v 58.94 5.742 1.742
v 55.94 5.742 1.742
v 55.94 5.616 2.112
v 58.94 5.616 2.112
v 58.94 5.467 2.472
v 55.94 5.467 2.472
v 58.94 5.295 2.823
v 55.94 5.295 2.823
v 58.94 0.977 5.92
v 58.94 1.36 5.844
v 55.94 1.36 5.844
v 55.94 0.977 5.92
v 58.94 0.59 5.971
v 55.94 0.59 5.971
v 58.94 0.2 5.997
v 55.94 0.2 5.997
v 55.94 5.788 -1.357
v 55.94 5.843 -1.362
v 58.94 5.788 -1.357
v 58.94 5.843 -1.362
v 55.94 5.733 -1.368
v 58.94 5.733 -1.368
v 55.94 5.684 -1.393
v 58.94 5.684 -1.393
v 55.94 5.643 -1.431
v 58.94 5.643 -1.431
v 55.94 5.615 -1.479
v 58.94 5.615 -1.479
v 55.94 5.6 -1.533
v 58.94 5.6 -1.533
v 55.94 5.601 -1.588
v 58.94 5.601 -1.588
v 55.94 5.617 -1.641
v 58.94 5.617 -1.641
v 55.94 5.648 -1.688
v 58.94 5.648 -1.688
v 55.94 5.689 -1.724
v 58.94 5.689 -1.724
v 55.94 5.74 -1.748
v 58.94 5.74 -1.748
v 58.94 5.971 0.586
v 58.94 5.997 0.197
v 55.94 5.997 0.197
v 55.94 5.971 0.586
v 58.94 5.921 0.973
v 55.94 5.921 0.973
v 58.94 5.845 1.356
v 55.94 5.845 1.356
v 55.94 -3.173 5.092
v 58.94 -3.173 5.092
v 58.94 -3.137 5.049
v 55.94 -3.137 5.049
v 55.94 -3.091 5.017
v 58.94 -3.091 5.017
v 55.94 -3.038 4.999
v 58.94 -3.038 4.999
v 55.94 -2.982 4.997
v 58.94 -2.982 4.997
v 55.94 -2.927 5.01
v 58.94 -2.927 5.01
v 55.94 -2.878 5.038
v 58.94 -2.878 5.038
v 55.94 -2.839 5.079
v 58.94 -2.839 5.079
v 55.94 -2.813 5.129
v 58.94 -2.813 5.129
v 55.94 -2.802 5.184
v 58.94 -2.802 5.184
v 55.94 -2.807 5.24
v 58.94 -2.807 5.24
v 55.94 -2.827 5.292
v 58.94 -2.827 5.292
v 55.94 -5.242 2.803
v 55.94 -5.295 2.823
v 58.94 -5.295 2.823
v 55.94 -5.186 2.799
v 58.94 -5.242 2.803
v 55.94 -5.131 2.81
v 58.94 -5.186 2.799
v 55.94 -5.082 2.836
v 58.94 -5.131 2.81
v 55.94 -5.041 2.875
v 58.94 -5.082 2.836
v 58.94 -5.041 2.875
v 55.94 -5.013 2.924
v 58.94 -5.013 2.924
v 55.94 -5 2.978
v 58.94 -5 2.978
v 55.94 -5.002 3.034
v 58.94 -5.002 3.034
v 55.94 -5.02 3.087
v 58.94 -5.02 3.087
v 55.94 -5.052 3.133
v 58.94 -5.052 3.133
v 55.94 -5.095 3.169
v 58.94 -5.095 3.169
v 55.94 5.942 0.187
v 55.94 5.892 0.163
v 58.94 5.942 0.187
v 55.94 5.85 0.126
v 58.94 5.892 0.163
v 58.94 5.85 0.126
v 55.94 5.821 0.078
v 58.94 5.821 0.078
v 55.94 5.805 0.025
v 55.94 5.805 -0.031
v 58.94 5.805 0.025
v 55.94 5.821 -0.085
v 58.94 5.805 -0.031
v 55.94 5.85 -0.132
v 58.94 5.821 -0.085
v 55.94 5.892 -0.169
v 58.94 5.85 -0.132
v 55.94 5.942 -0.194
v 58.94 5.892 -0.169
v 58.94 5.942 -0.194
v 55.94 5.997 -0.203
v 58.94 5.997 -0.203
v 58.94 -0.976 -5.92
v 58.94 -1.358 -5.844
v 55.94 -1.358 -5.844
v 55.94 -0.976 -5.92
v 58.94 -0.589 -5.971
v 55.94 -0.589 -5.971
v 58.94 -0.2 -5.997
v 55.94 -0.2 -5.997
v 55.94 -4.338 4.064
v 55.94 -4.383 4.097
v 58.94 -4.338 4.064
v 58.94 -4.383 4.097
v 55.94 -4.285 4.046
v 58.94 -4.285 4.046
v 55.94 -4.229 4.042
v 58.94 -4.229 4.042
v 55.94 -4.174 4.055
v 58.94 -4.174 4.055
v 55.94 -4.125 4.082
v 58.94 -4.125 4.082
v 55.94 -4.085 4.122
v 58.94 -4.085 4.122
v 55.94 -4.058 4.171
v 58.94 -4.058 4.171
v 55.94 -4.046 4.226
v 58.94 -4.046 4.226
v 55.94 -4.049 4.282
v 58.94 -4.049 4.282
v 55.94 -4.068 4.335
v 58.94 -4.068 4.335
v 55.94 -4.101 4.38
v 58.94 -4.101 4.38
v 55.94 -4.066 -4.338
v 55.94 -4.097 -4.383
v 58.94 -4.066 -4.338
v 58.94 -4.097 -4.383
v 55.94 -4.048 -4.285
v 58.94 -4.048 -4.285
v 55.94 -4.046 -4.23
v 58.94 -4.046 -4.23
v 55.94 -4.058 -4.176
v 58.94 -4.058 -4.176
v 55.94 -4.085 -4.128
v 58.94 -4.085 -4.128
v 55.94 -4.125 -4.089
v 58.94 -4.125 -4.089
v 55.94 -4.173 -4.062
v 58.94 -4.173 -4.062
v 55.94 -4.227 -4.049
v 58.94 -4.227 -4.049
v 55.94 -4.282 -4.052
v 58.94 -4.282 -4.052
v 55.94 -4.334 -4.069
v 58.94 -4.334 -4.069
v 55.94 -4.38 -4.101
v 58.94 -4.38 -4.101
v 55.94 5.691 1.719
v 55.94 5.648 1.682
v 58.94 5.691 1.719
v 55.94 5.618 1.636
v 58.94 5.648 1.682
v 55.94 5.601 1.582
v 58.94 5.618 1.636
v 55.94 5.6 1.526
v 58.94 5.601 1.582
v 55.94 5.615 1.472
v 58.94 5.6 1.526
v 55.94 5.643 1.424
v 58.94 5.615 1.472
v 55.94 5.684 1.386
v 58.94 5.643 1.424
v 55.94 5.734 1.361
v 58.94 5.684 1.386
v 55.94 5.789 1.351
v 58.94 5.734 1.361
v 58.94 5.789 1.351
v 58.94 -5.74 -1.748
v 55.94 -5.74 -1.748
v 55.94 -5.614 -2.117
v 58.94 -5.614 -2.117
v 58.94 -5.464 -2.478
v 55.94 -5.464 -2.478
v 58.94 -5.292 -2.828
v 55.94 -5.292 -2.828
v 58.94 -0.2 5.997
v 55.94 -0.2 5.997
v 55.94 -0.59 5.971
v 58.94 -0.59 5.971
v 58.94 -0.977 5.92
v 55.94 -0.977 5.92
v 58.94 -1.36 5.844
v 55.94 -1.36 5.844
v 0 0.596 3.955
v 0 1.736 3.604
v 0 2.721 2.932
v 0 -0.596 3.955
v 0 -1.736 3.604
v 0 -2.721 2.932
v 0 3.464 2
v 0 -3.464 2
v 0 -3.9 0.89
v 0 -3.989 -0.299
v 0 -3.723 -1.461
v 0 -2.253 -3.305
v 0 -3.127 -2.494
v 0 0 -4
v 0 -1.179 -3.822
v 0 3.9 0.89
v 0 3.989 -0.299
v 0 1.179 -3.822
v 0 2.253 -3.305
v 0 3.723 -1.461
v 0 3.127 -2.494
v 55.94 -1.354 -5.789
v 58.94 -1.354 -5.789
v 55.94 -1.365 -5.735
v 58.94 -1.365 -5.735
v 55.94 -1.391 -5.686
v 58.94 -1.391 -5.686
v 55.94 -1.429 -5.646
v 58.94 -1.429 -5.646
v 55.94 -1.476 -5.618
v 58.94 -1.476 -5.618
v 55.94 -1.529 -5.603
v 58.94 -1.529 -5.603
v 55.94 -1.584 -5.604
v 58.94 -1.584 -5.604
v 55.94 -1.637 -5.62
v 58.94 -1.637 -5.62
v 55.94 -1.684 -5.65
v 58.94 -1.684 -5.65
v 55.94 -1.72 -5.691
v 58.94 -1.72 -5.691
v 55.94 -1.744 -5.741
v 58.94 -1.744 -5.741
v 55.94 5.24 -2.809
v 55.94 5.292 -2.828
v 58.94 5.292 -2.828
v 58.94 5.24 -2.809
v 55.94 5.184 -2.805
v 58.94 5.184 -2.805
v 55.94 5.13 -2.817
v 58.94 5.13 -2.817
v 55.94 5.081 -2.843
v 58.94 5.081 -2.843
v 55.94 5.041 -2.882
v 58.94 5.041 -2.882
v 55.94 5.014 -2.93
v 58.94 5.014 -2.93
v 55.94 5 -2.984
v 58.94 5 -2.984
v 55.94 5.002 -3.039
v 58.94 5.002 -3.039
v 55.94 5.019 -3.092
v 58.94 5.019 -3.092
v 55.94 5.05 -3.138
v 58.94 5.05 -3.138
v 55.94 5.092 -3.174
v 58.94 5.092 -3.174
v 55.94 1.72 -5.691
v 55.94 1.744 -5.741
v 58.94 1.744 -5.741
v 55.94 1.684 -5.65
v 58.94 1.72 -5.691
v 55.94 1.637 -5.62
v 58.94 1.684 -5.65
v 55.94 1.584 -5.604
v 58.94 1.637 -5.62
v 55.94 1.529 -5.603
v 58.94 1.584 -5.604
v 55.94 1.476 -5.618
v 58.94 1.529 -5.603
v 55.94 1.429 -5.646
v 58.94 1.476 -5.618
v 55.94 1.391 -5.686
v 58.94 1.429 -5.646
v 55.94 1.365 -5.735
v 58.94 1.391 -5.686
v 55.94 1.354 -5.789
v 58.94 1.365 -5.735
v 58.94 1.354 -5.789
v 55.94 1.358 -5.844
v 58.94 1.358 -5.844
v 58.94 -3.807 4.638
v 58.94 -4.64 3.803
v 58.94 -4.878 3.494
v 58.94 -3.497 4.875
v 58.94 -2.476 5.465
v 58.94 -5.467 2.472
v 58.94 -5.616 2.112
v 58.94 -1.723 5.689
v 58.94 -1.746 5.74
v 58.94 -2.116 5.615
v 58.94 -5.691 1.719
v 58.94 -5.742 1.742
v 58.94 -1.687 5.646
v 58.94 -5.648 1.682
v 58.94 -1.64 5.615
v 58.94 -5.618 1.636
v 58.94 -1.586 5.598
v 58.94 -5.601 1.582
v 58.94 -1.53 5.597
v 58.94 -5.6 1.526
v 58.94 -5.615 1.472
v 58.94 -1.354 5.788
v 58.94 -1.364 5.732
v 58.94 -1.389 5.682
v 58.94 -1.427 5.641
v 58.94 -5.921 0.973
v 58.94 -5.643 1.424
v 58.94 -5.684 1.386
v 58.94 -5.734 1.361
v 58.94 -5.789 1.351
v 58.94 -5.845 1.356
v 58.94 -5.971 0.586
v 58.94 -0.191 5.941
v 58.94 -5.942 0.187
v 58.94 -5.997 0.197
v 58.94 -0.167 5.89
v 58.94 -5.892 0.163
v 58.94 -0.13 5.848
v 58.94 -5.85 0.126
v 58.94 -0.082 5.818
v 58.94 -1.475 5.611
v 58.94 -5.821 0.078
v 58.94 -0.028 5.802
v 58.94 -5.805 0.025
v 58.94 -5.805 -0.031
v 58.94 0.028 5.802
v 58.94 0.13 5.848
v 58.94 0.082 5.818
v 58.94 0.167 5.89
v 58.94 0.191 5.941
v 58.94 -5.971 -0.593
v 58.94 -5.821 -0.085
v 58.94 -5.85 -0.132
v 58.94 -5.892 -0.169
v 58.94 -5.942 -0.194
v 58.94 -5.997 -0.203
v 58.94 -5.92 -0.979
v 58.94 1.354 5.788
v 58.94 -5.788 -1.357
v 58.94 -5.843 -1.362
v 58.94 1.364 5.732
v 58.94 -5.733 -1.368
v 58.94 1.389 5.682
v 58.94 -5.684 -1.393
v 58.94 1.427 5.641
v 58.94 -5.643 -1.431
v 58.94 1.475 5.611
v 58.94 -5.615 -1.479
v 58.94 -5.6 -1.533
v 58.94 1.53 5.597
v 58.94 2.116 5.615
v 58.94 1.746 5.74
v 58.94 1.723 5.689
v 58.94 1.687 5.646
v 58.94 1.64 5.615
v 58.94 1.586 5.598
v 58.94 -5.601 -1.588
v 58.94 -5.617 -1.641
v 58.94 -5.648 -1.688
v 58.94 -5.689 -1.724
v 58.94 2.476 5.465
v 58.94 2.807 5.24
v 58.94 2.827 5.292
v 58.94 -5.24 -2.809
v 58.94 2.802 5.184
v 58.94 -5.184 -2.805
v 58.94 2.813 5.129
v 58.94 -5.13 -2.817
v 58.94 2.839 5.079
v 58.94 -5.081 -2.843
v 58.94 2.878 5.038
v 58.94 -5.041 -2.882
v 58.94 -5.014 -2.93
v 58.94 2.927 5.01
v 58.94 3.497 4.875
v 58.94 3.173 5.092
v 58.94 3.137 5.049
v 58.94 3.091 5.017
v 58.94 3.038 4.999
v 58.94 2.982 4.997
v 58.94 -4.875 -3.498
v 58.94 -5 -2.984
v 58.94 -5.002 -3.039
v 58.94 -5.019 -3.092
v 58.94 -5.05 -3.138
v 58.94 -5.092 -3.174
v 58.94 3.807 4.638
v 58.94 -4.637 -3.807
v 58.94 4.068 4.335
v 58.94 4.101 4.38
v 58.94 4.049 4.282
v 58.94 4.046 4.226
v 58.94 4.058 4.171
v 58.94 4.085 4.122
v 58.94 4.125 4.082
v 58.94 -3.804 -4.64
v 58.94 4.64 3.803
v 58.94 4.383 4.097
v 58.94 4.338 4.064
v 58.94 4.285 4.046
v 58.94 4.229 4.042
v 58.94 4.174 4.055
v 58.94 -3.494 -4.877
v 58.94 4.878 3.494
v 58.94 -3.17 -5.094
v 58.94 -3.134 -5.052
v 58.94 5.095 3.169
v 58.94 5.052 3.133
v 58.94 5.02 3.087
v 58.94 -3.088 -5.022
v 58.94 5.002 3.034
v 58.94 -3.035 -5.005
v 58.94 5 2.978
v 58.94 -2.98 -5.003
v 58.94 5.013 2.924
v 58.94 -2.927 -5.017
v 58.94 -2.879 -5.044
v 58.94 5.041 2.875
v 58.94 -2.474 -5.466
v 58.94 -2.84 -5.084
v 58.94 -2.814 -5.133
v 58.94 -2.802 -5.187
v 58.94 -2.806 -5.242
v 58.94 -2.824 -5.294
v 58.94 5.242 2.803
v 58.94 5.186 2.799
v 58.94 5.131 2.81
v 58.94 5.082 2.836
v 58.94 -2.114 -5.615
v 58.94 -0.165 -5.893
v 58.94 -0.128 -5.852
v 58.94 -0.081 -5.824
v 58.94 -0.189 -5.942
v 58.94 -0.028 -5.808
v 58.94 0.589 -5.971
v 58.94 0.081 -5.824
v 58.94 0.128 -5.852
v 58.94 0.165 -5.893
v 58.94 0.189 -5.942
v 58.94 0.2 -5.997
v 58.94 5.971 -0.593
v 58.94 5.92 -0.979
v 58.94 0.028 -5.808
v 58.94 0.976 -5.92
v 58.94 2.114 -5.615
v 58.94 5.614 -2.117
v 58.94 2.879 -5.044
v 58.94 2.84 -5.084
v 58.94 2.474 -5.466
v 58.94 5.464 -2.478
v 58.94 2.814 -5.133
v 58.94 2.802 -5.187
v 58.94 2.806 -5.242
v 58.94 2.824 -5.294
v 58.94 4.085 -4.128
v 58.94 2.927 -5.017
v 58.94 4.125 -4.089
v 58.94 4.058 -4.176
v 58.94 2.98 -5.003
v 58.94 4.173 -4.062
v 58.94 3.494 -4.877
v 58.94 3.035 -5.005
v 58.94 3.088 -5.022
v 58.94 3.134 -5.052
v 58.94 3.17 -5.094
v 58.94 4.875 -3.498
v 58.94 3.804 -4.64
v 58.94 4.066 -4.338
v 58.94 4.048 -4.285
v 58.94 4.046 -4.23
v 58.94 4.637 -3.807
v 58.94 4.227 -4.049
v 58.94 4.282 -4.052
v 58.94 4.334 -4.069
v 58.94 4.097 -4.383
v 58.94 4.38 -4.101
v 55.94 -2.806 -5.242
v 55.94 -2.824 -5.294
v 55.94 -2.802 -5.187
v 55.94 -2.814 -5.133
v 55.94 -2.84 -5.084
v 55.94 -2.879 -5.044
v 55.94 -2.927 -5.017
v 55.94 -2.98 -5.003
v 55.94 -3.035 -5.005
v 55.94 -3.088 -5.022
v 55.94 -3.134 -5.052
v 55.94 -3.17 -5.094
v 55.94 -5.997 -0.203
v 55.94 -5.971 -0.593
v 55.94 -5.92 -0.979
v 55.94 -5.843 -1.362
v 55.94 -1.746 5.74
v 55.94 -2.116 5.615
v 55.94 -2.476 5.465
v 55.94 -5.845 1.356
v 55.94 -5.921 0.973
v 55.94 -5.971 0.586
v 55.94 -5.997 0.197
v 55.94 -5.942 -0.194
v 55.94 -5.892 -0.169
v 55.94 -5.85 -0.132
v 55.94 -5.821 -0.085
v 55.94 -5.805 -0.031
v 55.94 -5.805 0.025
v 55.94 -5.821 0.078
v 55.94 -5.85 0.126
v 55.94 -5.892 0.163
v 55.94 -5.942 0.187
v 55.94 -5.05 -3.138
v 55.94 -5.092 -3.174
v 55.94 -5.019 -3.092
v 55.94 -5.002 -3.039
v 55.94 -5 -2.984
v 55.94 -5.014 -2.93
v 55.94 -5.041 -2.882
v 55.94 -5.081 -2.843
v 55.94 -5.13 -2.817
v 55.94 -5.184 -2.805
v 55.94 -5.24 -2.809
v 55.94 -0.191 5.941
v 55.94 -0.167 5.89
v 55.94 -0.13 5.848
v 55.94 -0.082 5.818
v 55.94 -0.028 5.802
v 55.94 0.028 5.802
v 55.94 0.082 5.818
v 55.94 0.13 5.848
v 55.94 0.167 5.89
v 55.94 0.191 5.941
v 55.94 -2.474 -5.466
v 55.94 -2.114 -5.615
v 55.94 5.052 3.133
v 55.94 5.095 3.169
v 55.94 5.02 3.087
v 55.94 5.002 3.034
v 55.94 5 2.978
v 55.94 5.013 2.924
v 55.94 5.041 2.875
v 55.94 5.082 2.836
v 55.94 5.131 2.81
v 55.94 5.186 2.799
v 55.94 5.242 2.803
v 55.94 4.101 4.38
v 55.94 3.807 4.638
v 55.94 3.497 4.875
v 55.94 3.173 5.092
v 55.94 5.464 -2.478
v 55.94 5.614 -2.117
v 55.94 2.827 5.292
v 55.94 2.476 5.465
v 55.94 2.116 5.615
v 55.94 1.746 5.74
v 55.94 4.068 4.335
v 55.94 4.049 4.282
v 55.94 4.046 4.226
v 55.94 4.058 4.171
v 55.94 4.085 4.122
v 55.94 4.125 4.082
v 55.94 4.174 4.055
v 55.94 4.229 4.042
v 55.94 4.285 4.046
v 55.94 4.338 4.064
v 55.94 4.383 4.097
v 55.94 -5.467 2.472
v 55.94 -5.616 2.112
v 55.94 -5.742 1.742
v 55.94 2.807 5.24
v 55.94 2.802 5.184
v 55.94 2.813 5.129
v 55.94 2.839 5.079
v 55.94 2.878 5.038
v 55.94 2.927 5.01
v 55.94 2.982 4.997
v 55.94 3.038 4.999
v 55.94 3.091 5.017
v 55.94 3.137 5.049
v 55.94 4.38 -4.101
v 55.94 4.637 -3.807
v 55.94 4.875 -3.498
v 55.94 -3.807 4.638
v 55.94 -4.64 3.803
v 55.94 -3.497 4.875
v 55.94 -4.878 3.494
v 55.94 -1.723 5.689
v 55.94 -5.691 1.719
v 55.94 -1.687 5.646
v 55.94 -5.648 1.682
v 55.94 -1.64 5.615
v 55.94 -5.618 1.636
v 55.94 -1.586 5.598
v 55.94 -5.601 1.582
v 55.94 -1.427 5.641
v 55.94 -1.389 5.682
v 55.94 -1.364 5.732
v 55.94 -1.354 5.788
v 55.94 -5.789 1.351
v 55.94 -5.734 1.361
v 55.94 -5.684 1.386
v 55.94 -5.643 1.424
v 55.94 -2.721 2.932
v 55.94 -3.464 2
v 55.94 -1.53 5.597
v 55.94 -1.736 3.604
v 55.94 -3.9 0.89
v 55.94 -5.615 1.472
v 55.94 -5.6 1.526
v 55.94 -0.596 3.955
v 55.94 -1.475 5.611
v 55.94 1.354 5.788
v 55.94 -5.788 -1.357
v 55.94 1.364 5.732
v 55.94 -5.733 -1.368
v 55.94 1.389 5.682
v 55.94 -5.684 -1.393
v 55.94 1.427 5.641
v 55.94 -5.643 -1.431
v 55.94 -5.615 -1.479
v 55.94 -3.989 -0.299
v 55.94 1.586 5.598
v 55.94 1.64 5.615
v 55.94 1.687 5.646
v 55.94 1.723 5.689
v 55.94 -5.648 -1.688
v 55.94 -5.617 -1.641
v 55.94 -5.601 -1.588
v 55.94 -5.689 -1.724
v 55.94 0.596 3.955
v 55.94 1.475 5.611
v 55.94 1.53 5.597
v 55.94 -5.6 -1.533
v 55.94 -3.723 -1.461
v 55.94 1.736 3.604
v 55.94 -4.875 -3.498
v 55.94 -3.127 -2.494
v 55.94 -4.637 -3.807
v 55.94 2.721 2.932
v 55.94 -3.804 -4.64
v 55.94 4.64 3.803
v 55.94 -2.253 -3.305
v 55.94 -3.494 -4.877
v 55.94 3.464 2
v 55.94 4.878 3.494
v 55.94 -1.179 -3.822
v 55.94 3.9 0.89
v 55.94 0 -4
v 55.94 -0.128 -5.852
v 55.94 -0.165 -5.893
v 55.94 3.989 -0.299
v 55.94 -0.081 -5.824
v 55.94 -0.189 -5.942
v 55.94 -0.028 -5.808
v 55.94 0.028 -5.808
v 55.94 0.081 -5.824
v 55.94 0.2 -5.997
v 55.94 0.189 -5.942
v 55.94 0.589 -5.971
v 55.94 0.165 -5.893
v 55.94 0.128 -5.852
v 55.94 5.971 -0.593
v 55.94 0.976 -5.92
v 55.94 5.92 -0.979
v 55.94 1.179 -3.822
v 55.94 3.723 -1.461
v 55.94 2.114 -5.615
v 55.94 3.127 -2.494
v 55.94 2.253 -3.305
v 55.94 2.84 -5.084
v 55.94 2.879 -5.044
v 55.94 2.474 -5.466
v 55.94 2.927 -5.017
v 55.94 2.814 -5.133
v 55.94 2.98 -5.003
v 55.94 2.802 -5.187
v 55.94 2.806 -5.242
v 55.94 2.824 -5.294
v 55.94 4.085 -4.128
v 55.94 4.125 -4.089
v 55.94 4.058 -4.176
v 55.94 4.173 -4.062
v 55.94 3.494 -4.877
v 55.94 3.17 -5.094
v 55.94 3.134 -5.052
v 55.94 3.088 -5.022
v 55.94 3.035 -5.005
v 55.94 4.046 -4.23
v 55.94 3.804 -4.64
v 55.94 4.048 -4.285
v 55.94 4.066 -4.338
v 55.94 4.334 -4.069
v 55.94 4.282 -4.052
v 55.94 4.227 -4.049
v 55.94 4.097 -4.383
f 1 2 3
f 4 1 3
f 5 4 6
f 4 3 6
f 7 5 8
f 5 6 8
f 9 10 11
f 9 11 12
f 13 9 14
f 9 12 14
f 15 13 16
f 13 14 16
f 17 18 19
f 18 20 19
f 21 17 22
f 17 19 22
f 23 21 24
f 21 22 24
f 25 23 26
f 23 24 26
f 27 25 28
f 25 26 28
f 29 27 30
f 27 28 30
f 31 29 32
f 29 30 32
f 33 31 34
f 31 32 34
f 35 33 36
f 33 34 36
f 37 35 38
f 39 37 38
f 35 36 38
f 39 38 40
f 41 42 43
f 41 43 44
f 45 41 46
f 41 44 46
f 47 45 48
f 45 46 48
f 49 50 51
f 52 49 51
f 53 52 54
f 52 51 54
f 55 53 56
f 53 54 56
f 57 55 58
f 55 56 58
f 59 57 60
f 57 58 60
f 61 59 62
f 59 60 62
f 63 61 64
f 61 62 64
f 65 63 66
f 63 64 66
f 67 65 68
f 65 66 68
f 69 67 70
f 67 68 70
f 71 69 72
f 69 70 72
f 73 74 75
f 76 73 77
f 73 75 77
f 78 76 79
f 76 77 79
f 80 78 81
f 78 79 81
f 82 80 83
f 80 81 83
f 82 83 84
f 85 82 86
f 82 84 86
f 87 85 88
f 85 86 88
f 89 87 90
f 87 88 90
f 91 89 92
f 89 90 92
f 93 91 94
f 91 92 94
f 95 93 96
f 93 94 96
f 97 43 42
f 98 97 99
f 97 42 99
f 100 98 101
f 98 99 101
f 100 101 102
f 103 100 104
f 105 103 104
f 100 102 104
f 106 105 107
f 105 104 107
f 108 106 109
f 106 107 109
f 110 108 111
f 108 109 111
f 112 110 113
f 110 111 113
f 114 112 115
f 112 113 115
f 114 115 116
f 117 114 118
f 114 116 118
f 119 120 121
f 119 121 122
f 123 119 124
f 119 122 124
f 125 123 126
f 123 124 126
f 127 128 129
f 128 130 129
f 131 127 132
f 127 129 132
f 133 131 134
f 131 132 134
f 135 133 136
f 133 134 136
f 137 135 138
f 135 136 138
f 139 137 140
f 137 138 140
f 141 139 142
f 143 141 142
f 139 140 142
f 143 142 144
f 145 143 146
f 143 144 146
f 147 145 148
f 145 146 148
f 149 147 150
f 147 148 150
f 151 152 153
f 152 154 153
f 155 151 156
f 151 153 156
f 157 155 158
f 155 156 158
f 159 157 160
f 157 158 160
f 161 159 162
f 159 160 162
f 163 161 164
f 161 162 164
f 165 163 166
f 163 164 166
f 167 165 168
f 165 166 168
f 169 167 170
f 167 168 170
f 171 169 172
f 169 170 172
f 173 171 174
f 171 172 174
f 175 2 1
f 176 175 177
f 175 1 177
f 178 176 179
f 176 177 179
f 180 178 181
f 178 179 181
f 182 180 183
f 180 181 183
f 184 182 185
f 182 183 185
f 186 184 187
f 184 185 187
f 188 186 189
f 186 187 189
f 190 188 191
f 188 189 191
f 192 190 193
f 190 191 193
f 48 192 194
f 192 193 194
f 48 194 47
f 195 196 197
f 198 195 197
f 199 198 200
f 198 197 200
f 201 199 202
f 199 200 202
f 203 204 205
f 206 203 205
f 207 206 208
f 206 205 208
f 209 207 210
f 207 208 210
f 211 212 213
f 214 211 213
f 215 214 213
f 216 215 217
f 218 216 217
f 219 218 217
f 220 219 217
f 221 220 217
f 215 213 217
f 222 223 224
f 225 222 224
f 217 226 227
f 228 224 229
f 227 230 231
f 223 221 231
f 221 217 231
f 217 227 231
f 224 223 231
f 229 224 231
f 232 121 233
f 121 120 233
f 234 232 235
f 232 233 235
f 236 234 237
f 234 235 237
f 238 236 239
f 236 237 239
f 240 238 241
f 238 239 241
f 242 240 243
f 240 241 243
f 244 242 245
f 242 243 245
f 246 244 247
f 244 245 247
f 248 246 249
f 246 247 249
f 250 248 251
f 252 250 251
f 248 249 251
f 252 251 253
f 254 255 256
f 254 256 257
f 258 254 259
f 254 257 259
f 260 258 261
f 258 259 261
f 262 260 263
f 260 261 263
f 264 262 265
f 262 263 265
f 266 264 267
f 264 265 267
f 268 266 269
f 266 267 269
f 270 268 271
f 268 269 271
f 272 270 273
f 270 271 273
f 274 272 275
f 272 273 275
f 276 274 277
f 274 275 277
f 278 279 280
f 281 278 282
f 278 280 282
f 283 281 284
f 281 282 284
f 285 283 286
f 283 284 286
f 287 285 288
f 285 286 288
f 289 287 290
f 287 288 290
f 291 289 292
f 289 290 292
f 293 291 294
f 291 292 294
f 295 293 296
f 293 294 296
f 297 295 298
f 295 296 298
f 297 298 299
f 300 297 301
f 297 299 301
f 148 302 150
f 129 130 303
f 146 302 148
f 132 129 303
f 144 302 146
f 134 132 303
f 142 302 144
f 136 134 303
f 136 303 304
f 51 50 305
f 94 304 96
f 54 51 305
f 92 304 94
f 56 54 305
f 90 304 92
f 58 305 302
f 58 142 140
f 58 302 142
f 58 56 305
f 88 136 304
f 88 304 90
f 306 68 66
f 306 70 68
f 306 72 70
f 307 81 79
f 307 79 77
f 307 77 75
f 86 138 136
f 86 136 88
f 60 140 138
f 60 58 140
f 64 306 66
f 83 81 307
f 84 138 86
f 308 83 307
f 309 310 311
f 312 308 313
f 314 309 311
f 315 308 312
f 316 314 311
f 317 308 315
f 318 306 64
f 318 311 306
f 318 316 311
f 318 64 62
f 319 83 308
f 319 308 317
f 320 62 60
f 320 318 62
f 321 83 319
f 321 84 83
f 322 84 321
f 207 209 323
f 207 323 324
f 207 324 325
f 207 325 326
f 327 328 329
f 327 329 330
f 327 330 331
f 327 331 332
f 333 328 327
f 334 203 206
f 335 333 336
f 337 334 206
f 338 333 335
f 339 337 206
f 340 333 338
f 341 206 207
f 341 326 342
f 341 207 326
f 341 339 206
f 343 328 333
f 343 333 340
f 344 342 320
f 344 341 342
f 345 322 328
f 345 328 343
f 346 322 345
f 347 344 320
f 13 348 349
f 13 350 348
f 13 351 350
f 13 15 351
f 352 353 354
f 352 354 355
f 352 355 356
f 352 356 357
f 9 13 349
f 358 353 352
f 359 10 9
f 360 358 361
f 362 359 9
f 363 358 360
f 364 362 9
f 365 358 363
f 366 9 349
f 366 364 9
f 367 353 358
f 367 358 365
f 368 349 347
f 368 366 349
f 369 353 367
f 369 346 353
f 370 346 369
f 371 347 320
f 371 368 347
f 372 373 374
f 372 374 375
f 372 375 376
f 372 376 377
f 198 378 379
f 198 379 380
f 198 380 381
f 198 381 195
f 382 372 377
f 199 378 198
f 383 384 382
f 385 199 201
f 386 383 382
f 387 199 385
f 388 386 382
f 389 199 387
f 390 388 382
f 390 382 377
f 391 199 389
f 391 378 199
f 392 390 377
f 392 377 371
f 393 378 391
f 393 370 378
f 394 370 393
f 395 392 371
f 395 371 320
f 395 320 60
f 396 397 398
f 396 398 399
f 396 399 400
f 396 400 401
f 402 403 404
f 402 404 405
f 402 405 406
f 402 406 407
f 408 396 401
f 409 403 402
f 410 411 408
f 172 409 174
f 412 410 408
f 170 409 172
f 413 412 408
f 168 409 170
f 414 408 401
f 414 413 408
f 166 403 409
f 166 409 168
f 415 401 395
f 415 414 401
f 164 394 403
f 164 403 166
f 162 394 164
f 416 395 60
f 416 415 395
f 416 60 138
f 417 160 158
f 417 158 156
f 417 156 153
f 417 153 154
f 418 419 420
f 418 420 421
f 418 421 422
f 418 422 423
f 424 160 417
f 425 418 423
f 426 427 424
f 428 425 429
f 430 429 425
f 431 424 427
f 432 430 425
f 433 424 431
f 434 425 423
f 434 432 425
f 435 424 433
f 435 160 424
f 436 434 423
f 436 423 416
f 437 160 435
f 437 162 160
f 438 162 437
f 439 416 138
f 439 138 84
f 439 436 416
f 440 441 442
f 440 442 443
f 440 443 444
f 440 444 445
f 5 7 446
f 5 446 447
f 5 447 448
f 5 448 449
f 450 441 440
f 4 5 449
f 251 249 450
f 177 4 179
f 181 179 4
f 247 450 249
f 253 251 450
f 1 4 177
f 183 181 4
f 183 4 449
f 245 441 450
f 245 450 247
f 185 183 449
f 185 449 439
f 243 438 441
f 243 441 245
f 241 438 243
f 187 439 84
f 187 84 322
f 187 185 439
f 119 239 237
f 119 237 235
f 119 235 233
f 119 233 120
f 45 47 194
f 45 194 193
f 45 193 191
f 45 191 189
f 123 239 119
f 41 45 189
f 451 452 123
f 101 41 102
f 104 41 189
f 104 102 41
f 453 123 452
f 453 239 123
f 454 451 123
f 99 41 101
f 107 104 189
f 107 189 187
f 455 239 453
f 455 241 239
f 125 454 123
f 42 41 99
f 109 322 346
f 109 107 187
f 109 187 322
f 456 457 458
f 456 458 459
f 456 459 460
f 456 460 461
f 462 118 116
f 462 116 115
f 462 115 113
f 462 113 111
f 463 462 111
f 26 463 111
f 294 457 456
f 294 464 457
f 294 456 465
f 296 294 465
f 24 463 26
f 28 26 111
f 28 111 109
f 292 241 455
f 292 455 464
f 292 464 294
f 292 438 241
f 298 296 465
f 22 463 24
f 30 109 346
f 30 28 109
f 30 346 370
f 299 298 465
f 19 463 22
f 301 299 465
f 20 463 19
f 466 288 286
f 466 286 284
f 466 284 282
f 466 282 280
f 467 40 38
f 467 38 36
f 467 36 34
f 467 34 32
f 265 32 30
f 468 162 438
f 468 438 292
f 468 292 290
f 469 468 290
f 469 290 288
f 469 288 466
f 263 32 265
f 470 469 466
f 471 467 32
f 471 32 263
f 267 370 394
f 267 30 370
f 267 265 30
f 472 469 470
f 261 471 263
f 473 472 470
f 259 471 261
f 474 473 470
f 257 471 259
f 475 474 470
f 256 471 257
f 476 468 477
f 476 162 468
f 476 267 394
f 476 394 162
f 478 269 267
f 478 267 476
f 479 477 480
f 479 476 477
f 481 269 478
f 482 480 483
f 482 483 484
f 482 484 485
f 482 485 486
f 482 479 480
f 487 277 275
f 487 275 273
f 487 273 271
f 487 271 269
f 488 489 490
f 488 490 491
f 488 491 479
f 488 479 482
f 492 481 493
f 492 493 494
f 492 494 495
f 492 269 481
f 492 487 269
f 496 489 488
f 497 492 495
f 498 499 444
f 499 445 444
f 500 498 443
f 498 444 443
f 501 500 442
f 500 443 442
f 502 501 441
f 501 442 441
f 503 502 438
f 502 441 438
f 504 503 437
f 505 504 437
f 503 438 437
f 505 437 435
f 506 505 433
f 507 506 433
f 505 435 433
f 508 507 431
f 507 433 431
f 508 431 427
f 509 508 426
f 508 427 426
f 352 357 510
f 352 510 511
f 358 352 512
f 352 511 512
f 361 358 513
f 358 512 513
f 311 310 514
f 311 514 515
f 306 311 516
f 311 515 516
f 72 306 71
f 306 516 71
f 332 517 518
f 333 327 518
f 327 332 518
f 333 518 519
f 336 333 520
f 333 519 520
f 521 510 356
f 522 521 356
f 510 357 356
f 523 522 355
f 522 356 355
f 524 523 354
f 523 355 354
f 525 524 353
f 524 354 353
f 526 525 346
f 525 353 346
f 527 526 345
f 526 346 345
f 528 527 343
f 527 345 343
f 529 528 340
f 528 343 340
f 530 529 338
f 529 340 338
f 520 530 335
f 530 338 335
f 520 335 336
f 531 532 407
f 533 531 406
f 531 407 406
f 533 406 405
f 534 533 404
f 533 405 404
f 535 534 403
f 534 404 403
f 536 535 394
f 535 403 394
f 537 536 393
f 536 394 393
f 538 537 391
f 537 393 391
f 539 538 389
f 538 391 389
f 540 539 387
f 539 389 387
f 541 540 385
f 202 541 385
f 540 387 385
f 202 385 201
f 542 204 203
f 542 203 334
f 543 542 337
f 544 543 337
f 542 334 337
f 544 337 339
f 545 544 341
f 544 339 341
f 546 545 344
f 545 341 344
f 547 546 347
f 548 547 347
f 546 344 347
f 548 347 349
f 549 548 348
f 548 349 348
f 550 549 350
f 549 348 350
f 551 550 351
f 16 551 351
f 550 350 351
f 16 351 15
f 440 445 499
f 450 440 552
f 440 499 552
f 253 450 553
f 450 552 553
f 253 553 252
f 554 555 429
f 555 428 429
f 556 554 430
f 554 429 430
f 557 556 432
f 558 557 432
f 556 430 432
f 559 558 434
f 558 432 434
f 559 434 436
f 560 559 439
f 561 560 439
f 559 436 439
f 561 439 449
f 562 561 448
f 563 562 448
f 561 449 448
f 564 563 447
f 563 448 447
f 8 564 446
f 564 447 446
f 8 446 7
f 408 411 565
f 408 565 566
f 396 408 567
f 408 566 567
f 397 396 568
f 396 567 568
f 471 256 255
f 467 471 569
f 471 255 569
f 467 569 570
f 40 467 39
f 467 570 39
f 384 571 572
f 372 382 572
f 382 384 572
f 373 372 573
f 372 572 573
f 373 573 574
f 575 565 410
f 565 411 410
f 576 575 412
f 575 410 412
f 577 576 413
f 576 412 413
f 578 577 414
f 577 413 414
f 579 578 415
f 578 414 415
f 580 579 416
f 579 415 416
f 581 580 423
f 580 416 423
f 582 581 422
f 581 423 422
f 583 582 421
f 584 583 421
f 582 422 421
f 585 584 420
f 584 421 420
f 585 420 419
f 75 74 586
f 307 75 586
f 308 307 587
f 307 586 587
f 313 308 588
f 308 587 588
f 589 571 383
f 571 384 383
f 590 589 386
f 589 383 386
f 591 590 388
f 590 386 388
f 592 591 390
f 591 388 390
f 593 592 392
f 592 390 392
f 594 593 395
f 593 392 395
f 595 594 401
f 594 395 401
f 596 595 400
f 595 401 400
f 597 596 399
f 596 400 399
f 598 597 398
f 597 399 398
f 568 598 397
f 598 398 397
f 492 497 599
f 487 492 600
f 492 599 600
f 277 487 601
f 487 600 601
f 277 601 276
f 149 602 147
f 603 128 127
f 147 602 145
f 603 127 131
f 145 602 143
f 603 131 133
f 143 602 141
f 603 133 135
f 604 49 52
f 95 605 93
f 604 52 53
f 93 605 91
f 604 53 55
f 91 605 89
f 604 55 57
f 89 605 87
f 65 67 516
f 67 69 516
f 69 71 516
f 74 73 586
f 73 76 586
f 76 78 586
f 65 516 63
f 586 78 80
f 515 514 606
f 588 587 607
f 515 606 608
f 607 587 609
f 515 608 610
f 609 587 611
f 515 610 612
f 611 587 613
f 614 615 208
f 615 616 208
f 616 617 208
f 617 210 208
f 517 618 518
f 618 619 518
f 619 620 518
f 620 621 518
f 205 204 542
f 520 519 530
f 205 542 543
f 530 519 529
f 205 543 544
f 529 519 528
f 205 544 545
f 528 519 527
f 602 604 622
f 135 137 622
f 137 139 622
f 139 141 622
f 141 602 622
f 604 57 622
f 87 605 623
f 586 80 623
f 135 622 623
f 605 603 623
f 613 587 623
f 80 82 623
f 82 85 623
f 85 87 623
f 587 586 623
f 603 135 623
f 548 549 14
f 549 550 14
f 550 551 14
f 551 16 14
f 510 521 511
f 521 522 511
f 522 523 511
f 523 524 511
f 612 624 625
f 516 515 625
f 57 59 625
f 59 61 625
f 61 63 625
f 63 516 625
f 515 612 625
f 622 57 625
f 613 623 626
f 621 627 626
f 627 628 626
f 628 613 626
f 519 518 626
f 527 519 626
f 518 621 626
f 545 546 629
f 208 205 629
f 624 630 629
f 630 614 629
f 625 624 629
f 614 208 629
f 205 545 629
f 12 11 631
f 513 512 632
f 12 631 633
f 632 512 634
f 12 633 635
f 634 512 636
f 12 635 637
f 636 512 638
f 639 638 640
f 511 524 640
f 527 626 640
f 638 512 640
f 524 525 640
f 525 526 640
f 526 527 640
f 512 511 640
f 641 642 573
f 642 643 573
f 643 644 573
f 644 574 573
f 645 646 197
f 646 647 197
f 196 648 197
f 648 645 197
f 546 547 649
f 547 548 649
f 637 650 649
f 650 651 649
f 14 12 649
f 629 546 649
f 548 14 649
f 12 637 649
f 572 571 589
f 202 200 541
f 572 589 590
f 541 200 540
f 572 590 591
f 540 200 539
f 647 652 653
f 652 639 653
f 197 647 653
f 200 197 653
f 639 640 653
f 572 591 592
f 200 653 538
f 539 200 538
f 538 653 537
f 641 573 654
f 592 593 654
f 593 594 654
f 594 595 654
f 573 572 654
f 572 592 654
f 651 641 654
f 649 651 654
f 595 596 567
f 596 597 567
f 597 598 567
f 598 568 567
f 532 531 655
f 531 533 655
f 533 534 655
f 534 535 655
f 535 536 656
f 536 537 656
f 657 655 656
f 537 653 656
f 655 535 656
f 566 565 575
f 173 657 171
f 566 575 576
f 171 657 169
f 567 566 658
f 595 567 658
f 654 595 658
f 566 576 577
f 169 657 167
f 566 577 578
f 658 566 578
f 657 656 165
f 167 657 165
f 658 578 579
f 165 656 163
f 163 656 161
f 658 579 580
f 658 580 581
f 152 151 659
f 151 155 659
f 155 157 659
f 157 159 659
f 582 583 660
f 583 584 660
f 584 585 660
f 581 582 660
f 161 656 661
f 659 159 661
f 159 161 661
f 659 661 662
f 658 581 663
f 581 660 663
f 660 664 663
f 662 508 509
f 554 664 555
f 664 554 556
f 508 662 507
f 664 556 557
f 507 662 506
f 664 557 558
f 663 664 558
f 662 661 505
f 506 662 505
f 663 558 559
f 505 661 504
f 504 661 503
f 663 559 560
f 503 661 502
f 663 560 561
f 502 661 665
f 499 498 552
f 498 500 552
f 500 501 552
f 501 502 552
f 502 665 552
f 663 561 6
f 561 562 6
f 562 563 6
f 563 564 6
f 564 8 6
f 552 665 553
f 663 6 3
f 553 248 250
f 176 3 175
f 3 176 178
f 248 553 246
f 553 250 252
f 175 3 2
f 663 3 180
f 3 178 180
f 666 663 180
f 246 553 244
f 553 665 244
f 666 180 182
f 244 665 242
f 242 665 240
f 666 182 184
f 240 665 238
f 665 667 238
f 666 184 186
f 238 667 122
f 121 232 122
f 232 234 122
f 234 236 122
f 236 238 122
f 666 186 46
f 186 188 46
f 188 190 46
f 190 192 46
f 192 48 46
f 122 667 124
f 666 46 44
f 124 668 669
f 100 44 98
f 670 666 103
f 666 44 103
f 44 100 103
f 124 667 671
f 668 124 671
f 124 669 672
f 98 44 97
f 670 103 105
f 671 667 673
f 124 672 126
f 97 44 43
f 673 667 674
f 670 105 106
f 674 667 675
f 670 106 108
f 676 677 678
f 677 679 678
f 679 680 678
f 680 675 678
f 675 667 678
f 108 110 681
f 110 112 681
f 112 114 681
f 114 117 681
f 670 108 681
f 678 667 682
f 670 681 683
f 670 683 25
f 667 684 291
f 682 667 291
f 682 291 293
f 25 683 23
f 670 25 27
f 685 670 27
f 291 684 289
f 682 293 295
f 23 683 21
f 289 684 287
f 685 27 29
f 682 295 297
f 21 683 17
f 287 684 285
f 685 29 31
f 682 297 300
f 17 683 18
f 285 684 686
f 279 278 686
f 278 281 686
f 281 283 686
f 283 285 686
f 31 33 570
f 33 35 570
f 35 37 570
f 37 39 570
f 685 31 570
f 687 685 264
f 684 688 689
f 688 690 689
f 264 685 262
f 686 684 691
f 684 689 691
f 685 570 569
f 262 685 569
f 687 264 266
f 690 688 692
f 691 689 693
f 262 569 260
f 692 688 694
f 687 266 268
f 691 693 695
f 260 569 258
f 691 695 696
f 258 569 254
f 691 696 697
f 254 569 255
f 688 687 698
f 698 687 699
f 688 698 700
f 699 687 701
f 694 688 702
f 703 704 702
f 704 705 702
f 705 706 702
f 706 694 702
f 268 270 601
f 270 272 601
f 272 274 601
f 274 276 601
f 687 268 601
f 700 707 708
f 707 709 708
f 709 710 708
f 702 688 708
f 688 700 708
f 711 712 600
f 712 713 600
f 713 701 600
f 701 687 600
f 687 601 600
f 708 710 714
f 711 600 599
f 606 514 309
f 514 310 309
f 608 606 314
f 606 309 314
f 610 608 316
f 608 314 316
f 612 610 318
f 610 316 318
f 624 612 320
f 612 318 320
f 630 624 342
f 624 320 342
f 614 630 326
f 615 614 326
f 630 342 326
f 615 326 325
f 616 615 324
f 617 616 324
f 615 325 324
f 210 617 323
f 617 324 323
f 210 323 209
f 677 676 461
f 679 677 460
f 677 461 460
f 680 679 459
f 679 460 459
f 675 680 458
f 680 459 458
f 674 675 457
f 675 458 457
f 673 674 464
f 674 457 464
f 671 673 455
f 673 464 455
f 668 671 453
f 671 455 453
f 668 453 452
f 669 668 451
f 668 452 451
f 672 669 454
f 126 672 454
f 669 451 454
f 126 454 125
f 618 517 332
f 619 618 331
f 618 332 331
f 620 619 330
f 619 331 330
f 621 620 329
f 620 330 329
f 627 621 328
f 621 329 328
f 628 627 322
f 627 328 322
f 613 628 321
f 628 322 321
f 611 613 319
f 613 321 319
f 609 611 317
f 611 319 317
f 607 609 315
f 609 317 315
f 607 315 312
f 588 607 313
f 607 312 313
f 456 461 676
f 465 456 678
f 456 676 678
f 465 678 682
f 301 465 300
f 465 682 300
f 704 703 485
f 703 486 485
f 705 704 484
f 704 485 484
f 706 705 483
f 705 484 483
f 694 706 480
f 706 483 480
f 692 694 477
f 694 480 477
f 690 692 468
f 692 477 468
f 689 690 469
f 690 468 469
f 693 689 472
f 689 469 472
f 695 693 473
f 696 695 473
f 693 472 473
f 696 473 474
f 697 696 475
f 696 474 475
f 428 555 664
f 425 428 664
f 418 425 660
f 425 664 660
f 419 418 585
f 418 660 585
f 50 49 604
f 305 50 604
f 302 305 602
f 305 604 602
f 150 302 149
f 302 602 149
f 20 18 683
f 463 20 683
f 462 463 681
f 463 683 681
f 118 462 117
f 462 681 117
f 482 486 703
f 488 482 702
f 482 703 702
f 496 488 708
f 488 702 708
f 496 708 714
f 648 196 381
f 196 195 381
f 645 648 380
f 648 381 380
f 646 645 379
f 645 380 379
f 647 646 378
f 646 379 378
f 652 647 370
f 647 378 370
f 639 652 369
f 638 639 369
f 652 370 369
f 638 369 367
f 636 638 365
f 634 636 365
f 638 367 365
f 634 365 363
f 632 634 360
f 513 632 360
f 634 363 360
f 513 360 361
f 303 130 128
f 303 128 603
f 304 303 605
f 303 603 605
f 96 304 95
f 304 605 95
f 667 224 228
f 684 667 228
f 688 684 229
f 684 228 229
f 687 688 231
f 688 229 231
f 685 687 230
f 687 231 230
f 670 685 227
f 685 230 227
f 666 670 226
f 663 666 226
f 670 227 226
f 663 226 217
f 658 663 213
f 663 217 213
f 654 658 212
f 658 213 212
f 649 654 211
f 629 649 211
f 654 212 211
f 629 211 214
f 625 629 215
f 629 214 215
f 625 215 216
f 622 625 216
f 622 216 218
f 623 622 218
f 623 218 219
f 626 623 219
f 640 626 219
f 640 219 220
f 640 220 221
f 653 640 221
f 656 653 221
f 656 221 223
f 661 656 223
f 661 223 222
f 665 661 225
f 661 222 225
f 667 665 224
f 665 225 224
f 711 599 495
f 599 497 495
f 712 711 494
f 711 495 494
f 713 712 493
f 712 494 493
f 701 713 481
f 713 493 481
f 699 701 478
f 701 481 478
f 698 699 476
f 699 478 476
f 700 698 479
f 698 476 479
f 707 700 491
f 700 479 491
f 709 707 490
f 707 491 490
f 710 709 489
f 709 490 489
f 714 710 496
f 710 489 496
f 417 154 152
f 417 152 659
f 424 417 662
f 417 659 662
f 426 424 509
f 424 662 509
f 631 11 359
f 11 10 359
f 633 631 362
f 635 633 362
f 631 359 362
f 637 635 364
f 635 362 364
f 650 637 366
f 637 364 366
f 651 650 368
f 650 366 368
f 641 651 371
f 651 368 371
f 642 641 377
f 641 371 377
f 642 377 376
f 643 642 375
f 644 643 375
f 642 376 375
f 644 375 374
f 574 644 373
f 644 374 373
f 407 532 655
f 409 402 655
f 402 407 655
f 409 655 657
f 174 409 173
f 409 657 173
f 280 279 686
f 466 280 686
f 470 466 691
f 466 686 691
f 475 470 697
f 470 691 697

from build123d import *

# Parameters (mm, degrees)
SKETCH1_R           = 4
BOSS_EXTRUDE2_DEPTH = 55.94
SKETCH2_R           = 6
BOSS_EXTRUDE3_DEPTH = 3
SKETCH3_R           = 0.2
CUT_EXTRUDE1_DEPTH  = 3
CIRPATTERN1_COUNT   = 24


with BuildPart() as part:
    # Sketch1 → Boss-Extrude2 (new body)
    with BuildSketch(Plane(origin=(0, 0, 0), x_dir=(0, 0, -1), z_dir=(1, 0, 0))):
        Circle(SKETCH1_R)
    extrude(amount=BOSS_EXTRUDE2_DEPTH)

    # Sketch2 → Boss-Extrude3 (add)
    with BuildSketch(Plane(origin=(55.94, 0, 0), x_dir=(0, 0, -1), z_dir=(1, 0, 0))):
        Circle(SKETCH2_R)
    extrude(amount=BOSS_EXTRUDE3_DEPTH)

    # Sketch3 → Cut-Extrude1 (cut)
    with BuildSketch(Plane(origin=(58.94, 0, 0), x_dir=(0, 0, -1), z_dir=(1, 0, 0))):
        with Locations((-6, 0)):
            Circle(SKETCH3_R)
    cut_extrude1 = extrude(amount=-CUT_EXTRUDE1_DEPTH, mode=Mode.SUBTRACT)

    # CirPattern1: Cut-Extrude1 ×24 about axis
    cirpattern1_axis = Axis((0, 0, -0.003264402), (1, 0, 0))
    for i in range(1, CIRPATTERN1_COUNT):
        add(cut_extrude1.rotate(cirpattern1_axis, i * 360 / CIRPATTERN1_COUNT), mode=Mode.SUBTRACT)


solid = part.part
